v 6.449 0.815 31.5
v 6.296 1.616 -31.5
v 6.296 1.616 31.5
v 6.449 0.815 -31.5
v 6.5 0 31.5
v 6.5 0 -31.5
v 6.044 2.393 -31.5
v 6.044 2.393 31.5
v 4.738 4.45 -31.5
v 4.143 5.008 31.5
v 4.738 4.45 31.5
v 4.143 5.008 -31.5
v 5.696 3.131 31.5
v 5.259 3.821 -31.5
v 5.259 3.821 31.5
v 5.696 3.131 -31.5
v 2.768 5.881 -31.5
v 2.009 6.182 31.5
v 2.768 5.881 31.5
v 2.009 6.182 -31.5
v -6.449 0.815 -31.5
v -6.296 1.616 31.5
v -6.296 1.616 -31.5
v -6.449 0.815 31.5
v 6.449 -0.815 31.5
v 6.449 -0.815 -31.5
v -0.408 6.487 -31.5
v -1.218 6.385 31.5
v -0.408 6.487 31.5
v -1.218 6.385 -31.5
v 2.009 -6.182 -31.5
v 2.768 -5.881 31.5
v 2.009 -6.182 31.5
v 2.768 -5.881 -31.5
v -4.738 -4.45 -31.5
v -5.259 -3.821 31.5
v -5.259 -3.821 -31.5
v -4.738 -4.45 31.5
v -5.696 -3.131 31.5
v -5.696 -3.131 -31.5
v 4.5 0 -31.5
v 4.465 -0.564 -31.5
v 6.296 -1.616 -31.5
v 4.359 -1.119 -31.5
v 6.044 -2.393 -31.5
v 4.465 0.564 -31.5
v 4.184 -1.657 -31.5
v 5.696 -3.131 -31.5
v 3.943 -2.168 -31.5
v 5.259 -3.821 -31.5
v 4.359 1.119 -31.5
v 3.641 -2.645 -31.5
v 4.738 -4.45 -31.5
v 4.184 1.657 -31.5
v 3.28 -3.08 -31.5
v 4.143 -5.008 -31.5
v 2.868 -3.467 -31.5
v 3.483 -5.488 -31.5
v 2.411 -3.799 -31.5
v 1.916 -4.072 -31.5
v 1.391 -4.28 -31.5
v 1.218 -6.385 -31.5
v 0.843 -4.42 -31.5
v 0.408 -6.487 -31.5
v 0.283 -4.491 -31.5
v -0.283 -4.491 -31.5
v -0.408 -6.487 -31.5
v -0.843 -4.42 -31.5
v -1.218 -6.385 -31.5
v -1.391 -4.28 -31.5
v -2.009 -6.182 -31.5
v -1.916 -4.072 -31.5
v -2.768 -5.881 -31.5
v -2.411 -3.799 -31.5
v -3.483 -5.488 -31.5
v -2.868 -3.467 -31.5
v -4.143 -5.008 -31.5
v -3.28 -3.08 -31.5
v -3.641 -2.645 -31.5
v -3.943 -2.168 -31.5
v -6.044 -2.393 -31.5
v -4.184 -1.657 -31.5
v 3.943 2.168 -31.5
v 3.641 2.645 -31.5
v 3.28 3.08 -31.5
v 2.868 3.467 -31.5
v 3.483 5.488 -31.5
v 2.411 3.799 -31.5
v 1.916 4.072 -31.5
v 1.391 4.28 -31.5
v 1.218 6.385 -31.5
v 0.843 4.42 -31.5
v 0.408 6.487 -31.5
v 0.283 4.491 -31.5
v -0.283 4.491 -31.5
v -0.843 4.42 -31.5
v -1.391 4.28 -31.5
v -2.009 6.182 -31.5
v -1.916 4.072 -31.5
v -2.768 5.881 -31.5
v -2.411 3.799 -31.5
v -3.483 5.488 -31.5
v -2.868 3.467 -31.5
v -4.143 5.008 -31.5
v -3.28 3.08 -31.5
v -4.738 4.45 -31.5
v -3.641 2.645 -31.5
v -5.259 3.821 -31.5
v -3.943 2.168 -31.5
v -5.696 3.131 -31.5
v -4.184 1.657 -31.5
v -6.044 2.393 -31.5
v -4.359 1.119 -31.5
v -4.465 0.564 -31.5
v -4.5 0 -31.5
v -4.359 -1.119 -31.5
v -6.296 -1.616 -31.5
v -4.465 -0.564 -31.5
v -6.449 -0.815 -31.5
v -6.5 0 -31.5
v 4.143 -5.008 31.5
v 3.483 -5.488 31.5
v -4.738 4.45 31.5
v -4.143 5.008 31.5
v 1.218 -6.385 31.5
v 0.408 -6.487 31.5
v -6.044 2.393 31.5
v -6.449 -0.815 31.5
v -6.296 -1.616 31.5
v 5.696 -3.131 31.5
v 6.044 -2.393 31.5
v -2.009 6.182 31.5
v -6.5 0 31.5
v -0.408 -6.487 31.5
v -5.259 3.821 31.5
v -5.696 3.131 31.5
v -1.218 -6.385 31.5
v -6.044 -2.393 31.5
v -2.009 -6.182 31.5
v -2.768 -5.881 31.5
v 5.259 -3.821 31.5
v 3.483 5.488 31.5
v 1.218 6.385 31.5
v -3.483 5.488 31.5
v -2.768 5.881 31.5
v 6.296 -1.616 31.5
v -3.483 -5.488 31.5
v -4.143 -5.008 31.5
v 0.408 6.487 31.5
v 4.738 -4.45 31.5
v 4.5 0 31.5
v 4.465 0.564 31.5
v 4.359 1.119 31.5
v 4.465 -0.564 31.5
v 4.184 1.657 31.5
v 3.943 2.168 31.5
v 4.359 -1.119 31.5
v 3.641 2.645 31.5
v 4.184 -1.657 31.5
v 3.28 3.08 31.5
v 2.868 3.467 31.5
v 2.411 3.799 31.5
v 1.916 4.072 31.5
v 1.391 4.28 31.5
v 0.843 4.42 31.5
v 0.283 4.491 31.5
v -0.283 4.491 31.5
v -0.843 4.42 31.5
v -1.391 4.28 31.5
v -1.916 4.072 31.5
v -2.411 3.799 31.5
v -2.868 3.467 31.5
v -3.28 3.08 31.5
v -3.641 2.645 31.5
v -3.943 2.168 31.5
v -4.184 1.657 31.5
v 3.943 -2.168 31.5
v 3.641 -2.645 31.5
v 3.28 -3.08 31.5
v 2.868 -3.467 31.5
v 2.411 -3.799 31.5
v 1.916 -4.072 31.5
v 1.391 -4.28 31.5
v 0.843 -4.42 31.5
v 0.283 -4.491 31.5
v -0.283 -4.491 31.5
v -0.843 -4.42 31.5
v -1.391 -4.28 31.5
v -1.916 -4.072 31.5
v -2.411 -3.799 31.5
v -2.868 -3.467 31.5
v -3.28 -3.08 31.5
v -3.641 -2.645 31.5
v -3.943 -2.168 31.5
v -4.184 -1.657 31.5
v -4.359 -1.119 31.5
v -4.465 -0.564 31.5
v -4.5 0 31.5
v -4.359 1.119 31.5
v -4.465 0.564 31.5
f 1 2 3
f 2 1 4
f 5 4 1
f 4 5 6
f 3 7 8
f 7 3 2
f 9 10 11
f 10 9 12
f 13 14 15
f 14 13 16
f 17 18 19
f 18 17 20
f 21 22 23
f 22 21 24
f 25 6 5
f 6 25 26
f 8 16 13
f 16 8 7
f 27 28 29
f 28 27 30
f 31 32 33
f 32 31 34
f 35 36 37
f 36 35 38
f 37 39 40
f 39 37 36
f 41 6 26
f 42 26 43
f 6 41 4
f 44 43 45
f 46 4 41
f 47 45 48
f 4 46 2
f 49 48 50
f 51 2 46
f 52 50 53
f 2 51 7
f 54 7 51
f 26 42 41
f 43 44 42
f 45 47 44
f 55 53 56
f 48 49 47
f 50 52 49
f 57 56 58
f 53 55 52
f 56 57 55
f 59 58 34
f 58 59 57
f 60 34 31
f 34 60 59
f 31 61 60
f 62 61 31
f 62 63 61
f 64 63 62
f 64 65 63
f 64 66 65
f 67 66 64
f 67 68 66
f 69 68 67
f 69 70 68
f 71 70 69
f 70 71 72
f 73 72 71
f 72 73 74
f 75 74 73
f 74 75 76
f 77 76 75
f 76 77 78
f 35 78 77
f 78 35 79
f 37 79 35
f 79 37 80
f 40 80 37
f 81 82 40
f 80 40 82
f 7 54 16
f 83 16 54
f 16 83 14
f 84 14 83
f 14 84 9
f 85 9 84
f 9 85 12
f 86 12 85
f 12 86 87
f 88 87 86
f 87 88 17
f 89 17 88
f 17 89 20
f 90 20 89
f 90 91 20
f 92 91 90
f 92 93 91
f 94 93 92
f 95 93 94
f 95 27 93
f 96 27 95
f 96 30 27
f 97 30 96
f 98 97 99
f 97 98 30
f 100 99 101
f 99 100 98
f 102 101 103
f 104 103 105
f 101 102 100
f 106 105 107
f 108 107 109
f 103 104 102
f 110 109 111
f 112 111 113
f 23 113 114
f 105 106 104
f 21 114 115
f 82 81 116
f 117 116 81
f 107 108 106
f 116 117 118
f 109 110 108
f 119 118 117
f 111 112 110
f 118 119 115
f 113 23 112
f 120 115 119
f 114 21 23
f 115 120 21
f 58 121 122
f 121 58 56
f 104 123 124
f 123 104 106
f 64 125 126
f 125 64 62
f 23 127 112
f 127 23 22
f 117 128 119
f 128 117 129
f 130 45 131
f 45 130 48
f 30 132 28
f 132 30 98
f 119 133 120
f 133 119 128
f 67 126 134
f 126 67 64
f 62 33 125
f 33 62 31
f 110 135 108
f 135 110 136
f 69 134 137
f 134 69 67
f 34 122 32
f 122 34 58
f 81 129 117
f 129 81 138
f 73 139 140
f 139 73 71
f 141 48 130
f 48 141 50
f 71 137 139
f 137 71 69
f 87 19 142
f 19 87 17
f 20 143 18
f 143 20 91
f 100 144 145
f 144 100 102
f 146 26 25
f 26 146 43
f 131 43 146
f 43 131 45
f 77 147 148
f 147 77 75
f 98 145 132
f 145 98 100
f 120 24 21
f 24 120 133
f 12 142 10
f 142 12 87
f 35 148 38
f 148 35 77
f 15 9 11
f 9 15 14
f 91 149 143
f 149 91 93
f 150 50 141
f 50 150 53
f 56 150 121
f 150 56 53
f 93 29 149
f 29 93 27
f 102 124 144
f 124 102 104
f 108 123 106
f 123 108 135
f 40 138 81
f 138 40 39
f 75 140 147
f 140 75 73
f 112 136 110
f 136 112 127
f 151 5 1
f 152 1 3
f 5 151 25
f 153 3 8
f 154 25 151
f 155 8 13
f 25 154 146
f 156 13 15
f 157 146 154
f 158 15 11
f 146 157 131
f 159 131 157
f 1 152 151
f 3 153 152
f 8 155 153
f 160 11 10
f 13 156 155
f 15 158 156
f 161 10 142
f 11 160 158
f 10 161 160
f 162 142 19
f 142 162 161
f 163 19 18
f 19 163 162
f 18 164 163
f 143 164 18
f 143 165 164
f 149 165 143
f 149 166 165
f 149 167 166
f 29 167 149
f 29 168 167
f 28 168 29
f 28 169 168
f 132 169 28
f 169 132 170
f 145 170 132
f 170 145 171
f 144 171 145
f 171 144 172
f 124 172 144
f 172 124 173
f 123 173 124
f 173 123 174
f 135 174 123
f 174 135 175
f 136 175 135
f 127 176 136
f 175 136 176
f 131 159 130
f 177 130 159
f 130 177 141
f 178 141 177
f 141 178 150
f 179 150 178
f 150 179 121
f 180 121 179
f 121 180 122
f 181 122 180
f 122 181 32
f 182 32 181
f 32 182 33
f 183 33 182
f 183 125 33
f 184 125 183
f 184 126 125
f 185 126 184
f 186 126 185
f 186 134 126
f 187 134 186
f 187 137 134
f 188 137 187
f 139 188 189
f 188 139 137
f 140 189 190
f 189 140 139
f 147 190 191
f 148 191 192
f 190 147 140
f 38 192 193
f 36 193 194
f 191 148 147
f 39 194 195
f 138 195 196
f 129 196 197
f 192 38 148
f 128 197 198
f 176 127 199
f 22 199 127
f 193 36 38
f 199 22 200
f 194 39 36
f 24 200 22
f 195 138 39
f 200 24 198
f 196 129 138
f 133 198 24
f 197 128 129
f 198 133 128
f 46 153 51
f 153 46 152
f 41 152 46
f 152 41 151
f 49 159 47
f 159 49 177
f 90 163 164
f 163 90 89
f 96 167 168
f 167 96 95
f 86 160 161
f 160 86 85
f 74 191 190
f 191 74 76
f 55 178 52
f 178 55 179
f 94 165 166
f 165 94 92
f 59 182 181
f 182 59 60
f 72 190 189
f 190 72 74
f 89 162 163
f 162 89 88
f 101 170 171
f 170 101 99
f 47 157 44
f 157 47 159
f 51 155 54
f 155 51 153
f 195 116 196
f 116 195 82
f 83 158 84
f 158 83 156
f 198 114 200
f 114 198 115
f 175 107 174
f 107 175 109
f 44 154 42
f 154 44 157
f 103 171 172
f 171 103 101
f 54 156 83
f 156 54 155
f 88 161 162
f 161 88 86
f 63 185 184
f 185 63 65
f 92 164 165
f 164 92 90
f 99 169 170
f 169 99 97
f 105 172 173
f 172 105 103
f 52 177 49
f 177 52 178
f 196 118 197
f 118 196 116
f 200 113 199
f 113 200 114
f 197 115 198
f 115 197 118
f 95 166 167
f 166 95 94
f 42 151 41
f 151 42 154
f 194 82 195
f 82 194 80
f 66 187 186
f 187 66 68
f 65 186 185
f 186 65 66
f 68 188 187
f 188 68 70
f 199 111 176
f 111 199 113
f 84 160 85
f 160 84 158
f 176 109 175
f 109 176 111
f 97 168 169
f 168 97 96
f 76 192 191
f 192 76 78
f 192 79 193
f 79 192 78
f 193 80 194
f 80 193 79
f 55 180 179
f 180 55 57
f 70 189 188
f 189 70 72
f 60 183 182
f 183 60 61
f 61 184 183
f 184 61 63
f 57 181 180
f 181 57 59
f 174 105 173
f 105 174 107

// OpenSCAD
$fn = 50;


difference() {
	union() {
		translate(v = [0, 0, -31.5000000000]) {
			cylinder(h = 63, r = 6.5000000000);
		}
	}
	union() {
		translate(v = [0, 0, -100.0000000000]) {
			cylinder(h = 200, r = 4.5000000000);
		}
	}
}
